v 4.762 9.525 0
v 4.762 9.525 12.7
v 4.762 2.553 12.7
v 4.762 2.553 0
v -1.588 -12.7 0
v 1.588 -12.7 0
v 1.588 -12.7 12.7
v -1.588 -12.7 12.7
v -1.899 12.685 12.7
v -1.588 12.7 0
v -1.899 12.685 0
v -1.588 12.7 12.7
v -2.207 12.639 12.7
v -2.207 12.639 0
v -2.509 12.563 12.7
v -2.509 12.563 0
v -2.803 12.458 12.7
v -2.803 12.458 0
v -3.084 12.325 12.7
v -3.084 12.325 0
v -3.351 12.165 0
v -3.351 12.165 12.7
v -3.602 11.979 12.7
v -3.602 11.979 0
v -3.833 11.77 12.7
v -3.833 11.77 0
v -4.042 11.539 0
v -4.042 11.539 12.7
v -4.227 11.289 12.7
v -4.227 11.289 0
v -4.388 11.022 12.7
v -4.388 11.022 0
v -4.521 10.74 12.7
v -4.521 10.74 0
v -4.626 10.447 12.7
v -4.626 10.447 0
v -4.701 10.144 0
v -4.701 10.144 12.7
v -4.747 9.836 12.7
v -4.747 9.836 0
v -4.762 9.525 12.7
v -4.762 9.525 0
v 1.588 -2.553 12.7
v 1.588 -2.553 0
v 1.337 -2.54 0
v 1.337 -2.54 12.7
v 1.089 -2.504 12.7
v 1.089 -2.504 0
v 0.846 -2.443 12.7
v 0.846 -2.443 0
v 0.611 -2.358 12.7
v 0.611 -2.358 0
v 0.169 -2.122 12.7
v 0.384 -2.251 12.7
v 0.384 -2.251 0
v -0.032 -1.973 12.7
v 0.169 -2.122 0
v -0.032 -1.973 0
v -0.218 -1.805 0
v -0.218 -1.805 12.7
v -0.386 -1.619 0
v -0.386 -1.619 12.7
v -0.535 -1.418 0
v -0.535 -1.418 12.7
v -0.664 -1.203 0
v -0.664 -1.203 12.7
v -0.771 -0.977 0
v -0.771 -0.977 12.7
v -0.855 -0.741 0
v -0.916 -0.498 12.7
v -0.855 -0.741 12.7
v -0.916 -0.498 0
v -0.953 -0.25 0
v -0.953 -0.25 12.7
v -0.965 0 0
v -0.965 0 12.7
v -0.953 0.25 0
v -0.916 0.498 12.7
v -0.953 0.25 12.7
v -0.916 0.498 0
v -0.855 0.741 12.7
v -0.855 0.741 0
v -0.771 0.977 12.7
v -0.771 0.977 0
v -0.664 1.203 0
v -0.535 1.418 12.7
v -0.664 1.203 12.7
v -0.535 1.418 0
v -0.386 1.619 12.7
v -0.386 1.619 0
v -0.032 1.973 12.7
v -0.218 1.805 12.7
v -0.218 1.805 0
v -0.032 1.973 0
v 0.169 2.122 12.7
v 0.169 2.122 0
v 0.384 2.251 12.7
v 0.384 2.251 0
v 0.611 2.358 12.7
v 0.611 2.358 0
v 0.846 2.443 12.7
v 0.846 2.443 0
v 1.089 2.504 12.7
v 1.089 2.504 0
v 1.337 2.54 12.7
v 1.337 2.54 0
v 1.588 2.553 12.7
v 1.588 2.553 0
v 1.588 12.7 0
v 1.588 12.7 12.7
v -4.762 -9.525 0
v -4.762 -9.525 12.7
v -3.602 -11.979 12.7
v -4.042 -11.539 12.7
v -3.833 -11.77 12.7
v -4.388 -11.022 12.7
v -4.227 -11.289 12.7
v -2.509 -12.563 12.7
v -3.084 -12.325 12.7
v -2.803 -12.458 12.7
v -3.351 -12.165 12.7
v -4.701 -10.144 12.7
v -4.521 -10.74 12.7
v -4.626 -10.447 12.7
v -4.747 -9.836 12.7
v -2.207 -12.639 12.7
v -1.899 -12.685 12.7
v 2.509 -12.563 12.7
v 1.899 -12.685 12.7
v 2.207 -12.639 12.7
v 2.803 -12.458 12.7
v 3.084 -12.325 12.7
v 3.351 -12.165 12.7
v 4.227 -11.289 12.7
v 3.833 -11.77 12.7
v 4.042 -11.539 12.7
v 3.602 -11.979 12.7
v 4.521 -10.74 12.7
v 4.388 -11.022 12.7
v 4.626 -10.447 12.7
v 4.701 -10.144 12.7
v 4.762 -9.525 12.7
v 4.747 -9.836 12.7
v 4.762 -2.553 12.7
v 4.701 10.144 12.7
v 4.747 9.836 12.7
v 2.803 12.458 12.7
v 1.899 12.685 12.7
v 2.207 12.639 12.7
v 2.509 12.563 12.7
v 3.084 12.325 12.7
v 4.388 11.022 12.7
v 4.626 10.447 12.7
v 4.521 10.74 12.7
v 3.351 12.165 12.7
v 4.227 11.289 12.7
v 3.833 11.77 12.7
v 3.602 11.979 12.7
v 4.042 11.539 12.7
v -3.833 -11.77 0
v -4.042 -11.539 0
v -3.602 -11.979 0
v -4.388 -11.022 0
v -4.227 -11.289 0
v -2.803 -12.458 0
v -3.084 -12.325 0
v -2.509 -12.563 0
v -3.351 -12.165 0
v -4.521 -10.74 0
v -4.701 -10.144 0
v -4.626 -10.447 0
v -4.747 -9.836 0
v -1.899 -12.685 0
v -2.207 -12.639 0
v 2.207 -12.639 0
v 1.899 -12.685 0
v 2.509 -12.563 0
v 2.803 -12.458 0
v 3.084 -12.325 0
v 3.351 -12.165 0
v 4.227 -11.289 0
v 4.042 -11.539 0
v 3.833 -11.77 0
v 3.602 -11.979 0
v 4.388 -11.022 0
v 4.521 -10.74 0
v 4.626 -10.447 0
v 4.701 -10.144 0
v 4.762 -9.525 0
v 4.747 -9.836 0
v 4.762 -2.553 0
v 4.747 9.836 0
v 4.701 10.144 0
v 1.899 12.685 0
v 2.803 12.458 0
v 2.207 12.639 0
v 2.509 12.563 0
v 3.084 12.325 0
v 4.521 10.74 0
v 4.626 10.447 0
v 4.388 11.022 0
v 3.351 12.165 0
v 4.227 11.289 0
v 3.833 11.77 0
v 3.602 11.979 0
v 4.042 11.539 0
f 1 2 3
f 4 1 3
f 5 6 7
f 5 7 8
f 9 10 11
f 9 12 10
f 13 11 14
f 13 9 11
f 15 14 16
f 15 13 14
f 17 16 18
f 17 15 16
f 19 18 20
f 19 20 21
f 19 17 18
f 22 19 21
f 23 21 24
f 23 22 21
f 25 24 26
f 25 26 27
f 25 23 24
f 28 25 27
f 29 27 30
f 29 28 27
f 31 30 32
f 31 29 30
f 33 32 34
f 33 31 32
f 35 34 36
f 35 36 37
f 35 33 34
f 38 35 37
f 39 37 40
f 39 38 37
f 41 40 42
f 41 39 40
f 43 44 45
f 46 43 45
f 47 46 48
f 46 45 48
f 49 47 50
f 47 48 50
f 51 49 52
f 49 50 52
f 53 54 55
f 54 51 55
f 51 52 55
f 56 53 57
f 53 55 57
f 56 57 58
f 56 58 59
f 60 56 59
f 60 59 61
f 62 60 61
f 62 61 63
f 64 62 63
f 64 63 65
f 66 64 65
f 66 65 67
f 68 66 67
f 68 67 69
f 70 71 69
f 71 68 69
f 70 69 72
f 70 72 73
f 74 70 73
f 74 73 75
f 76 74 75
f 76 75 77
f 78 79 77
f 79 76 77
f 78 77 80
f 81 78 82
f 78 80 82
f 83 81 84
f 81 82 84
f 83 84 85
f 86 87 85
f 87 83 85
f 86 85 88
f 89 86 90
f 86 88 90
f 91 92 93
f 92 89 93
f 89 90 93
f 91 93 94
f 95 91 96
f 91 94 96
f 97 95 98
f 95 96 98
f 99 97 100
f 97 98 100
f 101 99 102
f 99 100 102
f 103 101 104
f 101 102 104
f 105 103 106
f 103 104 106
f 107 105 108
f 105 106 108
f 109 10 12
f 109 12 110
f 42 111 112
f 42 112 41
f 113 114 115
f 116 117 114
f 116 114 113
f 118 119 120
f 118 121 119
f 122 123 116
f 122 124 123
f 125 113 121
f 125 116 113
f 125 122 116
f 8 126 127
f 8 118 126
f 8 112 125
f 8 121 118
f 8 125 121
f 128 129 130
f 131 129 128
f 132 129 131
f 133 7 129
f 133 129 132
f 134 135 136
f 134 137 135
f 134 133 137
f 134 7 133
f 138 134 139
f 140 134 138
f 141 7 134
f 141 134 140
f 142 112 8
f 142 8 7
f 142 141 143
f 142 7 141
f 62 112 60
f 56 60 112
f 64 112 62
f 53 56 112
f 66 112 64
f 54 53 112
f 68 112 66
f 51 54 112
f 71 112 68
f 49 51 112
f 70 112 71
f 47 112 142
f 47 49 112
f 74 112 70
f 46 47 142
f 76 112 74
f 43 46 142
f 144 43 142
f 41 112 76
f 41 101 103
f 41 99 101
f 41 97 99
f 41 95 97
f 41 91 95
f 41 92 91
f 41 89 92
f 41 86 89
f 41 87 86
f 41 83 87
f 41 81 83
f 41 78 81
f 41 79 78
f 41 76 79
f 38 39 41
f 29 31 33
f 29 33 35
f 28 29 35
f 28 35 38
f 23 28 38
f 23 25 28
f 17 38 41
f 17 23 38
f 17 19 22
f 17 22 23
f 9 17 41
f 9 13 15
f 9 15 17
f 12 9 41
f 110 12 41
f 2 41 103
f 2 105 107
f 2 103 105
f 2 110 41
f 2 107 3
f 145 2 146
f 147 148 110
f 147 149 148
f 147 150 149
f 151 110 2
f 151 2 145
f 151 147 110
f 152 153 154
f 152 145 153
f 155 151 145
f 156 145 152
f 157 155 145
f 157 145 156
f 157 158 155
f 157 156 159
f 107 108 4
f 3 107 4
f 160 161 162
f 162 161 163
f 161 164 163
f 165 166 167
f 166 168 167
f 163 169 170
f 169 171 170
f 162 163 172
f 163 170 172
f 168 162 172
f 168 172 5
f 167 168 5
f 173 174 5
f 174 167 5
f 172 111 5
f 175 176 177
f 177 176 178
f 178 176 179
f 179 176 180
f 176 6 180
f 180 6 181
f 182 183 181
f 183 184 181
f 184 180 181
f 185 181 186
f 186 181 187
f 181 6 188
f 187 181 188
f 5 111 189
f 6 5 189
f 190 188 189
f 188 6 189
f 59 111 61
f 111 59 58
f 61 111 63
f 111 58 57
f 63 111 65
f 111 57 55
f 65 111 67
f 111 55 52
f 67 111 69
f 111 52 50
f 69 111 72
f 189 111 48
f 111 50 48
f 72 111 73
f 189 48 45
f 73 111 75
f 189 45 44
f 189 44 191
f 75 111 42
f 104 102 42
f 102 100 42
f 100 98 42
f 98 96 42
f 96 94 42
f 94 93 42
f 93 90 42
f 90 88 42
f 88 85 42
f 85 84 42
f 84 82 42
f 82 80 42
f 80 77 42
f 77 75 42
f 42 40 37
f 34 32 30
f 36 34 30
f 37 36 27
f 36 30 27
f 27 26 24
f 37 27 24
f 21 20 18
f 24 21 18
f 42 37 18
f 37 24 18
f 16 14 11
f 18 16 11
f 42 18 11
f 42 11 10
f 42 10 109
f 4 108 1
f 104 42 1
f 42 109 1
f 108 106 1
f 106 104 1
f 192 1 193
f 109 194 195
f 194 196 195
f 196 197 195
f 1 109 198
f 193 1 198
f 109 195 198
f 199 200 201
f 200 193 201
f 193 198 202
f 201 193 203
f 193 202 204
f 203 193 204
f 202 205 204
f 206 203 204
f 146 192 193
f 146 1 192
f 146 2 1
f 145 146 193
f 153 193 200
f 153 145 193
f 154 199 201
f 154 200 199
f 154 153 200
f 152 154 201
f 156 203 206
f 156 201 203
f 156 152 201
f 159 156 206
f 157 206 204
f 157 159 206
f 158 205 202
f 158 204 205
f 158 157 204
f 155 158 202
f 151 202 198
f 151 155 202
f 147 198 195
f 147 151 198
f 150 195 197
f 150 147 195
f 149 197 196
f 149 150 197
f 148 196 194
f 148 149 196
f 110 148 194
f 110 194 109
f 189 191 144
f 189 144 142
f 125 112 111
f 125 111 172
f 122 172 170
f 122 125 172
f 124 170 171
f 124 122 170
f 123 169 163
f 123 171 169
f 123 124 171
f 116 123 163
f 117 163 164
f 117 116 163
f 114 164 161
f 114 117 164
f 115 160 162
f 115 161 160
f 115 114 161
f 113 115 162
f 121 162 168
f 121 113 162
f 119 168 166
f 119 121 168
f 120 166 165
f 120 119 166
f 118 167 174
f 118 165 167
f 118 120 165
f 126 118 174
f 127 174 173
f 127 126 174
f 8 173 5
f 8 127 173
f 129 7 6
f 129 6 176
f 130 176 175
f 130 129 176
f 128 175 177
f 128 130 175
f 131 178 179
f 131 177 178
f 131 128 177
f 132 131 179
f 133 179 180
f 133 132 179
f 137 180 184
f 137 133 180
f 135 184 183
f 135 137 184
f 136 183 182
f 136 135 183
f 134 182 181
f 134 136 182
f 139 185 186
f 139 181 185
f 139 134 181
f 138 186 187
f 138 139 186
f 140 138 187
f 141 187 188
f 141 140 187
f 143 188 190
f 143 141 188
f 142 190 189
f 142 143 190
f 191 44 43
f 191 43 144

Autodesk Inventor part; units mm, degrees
ref_plane "YZ Plane" through (0, 0, 0) normal (1, 0, 0) x (0, 1, 0)
ref_plane "XZ Plane" through (0, 0, 0) normal (0, 1, 0) x (-1, 0, 0)
ref_plane "XY Plane" through (0, 0, 0) normal (0, 0, 1) x (1, 0, 0)
sketch "Sketch1" plane through (0, 0, 0) normal (0, 0, 1) x (1, 0, 0)
  line L0 (-4.7625, 12.7) -> (4.7625, 12.7)
  line L1 (4.7625, 12.7) -> (4.7625, -12.7)
  line L2 (4.7625, -12.7) -> (-4.7625, -12.7)
  line L3 (-4.7625, -12.7) -> (-4.7625, 12.7)
  line L4 (-4.7625, 12.7) -> (4.7625, -12.7) construction
  line L5 (4.7625, 12.7) -> (-4.7625, -12.7) construction
  circle A0 centre (1.5875, 0) radius 2.5527
  line L6 (1.5875, 2.5527) -> (4.7625, 2.5527)
  line L7 (1.5875, -2.5527) -> (4.7625, -2.5527)
  point P0 (0, 0)
  dimension "d0" = 9.525
  dimension "d1" = 25.4
  dimension "d2" = 3.175
  dimension "d3" = 12.7
  dimension "d4" = 5.1054
extrude "Extrusion1" add sketch "Sketch1" along normal blind 12.7 contours L0 L1 L6 A0 L7 L2 L3
fillet "Fillet1" radius 3.175 4 edges at (-4.7625, 12.7, 6.35) (4.7625, 12.7, 6.35) (4.7625, -12.7, 6.35) (-4.7625, -12.7, 6.35)
properties part number "CANdle spacer" material "ABS Plastic"
